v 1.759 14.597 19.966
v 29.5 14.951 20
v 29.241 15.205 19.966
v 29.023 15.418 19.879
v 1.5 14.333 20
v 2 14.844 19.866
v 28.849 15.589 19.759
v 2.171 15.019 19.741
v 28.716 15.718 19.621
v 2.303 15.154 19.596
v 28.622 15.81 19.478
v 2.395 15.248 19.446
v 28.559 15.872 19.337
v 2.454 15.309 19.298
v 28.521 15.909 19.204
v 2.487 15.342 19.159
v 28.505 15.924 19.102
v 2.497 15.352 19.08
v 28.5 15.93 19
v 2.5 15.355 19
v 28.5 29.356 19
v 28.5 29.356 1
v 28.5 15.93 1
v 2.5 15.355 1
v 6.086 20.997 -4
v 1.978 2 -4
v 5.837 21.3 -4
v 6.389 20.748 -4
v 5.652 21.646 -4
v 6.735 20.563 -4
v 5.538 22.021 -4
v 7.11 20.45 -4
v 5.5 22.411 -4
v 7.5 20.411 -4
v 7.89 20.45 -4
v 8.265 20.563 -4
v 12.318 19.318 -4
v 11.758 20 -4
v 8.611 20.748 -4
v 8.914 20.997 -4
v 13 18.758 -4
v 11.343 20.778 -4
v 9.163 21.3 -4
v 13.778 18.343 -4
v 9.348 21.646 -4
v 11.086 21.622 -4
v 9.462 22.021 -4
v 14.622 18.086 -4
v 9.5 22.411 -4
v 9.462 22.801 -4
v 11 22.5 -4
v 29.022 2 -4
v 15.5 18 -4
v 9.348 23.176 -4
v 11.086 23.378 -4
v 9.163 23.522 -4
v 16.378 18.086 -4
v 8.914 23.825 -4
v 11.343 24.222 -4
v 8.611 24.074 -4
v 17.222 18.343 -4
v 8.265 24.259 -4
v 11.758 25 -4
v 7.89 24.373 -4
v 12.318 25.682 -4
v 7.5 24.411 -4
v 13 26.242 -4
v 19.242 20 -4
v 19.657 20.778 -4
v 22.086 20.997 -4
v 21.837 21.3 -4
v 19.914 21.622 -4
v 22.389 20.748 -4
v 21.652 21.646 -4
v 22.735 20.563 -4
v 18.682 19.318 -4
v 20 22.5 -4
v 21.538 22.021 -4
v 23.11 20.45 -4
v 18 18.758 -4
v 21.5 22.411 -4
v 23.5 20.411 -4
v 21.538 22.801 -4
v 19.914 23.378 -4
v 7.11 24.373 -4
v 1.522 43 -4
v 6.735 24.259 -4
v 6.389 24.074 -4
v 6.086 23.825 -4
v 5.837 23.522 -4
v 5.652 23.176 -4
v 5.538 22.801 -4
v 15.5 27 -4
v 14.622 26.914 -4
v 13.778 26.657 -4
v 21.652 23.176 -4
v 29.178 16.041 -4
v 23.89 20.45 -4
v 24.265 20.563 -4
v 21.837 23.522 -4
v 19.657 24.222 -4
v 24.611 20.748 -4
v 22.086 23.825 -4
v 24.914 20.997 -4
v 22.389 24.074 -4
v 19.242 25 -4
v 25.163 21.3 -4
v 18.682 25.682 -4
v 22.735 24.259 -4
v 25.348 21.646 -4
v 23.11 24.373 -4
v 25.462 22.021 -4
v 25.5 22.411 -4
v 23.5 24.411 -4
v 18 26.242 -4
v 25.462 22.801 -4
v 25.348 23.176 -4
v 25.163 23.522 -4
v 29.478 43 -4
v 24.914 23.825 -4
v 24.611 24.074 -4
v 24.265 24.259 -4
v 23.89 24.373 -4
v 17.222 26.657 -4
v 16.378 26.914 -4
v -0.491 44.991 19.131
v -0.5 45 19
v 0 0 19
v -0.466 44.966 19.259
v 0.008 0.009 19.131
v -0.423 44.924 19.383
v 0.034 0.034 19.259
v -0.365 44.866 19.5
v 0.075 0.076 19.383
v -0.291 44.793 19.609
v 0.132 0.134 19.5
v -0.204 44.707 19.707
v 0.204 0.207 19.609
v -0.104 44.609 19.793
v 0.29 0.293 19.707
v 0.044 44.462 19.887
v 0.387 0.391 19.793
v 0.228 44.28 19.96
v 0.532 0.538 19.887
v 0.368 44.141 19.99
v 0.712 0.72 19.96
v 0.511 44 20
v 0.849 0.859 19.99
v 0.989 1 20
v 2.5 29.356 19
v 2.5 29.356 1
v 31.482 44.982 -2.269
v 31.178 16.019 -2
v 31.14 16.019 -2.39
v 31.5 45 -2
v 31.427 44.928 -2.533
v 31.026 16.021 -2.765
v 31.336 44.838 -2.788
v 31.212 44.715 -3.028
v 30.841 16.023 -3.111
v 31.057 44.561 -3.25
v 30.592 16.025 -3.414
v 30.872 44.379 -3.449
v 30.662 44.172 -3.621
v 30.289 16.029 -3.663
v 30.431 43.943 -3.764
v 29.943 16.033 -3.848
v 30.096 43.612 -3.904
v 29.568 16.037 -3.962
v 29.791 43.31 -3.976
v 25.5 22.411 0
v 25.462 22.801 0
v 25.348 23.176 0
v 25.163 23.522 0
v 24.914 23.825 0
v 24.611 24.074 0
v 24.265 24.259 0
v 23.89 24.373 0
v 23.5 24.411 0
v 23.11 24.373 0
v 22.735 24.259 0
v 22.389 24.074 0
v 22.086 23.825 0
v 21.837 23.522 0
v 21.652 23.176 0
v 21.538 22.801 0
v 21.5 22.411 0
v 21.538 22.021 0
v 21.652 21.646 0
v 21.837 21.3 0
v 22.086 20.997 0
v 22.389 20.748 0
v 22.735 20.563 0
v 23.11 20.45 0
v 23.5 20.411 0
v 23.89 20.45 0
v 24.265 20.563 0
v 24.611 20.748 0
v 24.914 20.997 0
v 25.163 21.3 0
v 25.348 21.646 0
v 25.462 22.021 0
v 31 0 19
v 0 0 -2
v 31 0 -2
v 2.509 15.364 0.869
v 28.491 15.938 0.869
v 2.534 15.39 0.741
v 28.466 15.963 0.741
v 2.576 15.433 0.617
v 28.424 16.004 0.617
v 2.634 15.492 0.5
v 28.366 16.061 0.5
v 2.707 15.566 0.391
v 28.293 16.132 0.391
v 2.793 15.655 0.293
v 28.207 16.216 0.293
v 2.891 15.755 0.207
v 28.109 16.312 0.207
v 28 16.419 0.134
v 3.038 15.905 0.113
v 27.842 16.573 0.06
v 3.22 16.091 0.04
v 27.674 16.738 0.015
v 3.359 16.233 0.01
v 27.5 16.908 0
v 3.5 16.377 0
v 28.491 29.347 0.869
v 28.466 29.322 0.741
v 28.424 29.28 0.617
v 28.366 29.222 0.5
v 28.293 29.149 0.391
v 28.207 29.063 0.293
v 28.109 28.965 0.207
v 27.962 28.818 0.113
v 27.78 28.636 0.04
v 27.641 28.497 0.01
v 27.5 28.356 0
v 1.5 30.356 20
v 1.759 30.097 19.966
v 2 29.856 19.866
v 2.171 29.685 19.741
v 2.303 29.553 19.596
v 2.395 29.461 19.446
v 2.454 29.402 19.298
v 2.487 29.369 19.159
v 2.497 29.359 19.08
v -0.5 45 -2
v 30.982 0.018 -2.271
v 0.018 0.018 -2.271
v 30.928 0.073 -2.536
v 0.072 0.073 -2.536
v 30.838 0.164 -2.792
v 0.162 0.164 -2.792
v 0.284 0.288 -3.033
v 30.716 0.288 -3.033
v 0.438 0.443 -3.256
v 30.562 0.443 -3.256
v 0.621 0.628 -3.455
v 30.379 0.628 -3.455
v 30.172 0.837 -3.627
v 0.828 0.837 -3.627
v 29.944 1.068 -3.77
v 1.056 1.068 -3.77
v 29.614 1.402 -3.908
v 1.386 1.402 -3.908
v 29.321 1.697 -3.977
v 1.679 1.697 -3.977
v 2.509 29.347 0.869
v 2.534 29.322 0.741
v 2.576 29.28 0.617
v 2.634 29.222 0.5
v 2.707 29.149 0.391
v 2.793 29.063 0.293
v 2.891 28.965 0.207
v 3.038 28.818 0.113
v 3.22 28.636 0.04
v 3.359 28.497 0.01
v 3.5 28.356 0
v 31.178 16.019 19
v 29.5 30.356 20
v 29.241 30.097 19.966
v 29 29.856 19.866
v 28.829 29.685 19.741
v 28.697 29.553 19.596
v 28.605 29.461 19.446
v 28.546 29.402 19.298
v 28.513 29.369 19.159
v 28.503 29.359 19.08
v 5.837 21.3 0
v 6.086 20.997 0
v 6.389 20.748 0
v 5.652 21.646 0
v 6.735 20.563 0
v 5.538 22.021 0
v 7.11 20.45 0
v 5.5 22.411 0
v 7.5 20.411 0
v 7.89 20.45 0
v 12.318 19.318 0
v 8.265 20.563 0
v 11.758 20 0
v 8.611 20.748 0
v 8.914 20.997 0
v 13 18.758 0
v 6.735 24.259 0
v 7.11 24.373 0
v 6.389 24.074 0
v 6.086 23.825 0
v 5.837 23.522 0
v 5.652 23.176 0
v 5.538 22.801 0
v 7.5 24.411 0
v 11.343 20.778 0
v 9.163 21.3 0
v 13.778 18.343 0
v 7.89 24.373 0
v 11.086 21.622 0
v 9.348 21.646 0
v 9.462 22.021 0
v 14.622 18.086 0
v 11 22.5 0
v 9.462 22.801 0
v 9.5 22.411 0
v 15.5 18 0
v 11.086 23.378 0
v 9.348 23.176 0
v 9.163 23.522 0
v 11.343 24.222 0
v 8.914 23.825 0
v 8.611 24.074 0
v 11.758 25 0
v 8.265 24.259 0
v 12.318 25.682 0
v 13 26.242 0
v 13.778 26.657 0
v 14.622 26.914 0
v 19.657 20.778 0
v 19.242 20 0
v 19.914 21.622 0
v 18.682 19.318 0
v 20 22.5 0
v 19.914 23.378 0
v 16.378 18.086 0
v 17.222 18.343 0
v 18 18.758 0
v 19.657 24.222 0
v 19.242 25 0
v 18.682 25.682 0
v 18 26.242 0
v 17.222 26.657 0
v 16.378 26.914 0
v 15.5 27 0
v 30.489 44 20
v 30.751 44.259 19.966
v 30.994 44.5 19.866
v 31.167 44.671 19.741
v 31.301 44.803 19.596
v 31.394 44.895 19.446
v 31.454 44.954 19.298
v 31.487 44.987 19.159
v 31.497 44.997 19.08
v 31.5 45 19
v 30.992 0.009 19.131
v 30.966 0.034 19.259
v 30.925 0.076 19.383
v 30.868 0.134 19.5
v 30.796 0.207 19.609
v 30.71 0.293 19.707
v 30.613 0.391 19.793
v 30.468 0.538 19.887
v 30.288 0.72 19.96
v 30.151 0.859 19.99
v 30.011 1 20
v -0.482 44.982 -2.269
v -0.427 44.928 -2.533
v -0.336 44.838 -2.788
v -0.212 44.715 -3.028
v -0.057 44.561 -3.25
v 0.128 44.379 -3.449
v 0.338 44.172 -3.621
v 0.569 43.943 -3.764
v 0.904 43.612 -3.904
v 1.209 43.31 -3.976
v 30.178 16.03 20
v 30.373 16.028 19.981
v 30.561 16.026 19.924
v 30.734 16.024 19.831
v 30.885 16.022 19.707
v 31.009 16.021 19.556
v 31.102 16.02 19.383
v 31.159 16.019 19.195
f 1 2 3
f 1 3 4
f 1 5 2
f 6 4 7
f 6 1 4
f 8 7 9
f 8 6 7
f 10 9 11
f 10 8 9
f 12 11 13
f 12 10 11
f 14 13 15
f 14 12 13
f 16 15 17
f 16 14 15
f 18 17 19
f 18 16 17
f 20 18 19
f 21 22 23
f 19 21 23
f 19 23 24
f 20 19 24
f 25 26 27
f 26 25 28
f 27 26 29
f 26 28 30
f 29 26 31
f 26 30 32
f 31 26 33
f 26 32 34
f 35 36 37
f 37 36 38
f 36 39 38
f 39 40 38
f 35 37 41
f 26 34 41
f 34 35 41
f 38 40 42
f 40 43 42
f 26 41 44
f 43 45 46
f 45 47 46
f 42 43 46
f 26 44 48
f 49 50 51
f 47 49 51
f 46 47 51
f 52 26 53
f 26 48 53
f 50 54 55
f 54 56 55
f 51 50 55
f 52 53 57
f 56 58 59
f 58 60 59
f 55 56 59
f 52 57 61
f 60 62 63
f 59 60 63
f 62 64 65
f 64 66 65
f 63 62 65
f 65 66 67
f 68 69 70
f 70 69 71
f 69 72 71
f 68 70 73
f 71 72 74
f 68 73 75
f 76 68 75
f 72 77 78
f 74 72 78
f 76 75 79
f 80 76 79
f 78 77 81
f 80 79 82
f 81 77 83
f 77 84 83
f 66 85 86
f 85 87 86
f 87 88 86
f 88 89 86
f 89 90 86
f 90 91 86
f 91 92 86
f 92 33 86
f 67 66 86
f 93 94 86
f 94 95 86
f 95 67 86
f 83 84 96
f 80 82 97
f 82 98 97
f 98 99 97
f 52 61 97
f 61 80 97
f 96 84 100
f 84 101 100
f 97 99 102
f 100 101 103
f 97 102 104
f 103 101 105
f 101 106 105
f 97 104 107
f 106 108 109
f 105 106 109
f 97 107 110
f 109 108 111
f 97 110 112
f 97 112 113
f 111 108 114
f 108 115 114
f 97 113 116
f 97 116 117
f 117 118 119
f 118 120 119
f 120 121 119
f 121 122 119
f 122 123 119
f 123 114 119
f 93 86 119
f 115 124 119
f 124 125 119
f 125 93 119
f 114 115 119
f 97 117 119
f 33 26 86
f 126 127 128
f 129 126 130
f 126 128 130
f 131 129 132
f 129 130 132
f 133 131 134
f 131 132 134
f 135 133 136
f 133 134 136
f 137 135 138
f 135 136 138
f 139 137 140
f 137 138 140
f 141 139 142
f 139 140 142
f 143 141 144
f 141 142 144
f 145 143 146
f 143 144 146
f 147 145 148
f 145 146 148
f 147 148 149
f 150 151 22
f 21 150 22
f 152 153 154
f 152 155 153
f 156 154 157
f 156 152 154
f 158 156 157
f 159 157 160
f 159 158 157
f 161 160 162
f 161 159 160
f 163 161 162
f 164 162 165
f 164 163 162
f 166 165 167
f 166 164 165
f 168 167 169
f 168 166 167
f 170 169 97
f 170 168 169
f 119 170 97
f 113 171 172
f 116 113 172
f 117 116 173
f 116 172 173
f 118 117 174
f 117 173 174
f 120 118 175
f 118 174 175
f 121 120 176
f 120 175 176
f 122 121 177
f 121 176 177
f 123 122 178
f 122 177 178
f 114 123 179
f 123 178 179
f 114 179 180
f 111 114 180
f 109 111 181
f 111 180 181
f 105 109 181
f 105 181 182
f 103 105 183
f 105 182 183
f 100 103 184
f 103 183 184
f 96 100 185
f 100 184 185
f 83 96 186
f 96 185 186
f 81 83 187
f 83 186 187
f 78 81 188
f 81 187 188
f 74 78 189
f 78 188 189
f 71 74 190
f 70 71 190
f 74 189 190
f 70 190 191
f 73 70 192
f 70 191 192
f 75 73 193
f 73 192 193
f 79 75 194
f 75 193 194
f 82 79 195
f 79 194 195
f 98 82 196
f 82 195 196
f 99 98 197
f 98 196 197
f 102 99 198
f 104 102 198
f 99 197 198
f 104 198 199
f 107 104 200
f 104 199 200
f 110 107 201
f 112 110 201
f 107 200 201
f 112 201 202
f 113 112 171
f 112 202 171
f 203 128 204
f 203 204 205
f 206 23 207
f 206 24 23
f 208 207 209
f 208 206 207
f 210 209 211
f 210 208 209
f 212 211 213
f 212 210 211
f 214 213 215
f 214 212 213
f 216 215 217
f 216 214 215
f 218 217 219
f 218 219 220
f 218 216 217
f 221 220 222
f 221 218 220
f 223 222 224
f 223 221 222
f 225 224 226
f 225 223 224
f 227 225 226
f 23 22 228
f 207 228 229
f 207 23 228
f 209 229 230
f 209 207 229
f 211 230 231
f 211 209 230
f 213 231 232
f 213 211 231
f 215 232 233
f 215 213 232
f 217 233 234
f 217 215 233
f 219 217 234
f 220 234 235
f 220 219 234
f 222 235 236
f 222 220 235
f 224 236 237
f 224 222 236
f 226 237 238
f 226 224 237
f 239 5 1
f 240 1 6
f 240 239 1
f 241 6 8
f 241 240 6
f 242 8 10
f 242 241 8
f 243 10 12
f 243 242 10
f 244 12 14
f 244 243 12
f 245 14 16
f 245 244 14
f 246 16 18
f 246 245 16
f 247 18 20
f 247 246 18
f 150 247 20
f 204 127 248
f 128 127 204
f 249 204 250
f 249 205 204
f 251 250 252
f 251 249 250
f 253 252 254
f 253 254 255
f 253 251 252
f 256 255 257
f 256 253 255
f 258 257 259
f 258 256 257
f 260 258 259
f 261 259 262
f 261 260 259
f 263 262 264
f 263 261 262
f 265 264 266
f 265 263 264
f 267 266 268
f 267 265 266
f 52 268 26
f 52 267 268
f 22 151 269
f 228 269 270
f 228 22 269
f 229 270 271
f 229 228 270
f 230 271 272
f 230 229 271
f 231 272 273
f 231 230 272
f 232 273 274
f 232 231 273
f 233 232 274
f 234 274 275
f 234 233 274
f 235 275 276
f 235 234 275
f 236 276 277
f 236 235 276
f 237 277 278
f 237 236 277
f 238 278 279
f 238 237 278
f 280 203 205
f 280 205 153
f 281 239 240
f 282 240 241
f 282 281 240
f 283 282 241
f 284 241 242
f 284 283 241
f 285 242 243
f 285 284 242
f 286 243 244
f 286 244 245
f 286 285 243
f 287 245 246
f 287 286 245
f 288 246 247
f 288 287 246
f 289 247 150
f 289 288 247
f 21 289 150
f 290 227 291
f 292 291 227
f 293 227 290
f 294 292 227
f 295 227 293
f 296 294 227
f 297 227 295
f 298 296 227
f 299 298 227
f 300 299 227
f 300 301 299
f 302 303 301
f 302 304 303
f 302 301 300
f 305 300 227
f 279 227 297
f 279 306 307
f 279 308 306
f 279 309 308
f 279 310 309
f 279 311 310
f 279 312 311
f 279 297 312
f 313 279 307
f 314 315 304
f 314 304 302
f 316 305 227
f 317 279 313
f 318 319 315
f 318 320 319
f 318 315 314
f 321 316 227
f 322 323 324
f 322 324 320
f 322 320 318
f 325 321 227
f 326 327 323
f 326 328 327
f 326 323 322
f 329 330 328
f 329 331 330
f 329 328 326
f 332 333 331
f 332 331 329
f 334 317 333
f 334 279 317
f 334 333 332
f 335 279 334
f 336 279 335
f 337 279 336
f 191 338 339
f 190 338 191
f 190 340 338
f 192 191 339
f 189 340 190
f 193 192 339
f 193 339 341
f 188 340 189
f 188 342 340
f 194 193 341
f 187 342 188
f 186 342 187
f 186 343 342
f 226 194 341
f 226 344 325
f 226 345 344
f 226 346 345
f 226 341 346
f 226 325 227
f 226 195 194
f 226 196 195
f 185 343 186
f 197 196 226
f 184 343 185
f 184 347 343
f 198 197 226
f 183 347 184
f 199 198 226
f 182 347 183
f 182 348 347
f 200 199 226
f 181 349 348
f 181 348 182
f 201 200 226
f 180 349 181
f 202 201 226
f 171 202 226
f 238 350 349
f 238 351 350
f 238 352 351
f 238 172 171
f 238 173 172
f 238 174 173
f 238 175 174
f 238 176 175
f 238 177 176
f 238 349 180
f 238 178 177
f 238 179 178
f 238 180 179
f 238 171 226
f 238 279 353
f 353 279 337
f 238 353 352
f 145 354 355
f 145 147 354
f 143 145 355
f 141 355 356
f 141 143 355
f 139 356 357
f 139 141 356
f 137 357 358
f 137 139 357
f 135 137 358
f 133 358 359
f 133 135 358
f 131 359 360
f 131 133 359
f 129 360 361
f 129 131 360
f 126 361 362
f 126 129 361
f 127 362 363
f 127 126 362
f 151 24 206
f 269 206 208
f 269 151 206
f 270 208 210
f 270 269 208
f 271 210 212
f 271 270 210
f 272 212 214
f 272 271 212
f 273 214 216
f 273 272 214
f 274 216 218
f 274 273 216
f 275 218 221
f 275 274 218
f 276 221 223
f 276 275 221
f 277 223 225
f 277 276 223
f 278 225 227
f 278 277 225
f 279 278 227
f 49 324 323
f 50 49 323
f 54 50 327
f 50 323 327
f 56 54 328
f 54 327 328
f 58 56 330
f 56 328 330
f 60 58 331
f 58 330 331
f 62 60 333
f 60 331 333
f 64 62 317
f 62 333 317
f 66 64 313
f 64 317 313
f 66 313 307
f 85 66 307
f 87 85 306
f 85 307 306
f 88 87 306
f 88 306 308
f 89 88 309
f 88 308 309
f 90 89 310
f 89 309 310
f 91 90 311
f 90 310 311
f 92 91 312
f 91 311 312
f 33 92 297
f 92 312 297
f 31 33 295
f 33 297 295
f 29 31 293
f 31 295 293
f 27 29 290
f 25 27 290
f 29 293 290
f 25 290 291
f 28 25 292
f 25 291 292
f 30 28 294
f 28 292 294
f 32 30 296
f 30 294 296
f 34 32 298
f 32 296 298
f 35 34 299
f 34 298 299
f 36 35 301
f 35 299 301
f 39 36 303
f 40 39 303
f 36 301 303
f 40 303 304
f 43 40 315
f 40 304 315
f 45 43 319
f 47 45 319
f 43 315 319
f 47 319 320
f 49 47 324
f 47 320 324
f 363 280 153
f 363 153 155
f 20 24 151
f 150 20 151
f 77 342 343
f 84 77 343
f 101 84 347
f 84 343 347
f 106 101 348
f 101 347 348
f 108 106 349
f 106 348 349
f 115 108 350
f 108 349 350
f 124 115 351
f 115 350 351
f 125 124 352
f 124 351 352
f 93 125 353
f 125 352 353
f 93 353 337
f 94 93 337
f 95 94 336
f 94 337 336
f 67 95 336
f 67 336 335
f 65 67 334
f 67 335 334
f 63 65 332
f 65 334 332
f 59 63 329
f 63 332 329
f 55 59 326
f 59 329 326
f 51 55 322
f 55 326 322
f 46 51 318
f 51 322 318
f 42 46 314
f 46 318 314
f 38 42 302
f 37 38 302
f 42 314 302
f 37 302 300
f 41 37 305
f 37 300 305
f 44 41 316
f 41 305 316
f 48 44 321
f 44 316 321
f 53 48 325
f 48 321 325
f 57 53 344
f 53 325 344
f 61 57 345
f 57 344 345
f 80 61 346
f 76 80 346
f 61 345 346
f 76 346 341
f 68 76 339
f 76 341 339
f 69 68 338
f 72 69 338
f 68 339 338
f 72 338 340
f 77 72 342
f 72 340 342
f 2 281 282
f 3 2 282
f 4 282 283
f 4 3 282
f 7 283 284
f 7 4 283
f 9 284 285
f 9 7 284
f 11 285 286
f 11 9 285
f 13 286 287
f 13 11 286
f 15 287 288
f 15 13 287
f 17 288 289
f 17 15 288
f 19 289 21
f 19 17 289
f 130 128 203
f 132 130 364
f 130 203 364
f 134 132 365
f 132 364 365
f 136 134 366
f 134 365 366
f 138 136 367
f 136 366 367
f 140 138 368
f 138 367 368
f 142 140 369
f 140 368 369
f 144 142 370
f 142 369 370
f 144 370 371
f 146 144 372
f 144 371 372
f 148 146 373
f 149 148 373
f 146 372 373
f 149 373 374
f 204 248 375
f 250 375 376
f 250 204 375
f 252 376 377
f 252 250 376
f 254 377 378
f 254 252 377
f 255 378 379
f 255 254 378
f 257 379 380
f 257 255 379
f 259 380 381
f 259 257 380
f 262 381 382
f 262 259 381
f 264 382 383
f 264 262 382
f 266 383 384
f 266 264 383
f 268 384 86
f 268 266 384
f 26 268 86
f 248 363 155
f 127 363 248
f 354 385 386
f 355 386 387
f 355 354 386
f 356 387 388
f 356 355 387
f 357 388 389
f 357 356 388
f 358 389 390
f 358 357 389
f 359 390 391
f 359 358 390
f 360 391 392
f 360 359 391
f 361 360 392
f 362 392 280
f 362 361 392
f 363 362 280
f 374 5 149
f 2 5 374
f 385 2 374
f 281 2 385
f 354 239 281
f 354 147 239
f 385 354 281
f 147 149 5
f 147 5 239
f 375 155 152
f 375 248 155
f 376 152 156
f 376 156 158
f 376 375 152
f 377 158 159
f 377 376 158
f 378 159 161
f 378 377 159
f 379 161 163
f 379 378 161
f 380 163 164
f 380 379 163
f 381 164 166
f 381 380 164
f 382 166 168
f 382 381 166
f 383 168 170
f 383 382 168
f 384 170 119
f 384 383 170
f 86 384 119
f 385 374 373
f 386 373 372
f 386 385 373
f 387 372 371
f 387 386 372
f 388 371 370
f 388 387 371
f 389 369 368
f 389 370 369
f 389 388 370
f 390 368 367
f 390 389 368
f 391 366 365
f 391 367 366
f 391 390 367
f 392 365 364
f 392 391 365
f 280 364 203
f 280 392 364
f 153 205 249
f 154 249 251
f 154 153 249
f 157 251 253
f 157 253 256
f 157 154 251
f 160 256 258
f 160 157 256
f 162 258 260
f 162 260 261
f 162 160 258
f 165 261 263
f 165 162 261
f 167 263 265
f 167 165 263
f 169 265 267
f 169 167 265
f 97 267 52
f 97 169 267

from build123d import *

# Parameters (mm, degrees)
F1_DEPTH = 20
F0_R     = 2
F0_R_2   = 4.5
F2_DEPTH = 4
F3_R     = 2
F4_R     = 1


with BuildPart() as f1:
    # F0 (on Top) → F1 (new body)
    with BuildSketch(Plane.XY):
        Polygon((-0.5, 45), (0, 0), (31, 0), (31.1779875703, 16.0188813289), (31.5, 45), (15.5, 45), align=None)
        Polygon((28.5000000559, 15.9295856795), (2.4999999441, 15.3551234695), (2.4999999441, 29.3559876404), (28.5000000559, 29.3559876404), align=None, mode=Mode.SUBTRACT)
    extrude(amount=F1_DEPTH)

    # F0 (on Top) → F2 (join)
    with BuildSketch(Plane.XY):
        Polygon((-0.5, 45), (0, 0), (31, 0), (31.1779875703, 16.0188813289), (31.5, 45), (15.5, 45), align=None)
        Polygon((28.5000000559, 15.9295856795), (2.4999999441, 15.3551234695), (2.4999999441, 29.3559876404), (28.5000000559, 29.3559876404), align=None, mode=Mode.SUBTRACT)
        Polygon((2.4999999441, 29.3559876404), (2.4999999441, 15.3551234695), (28.5000000559, 15.9295856795), (28.5000000559, 29.3559876404), align=None)
        with Locations((7.5, 22.4111111111)):
            Circle(F0_R, mode=Mode.SUBTRACT)
        with Locations((23.5, 22.4111111111)):
            Circle(F0_R, mode=Mode.SUBTRACT)
        with Locations((15.5, 22.5)):
            Circle(F0_R_2, mode=Mode.SUBTRACT)
    extrude(amount=-F2_DEPTH)

    # F3
    f3_edges = [f1.edges().sort_by_distance(p)[0] for p in [
        (31.25, 22.5, -4),
        (15.5, 0, -4),
        (-0.25, 22.5, -4),
        (15.5, 45, -4),
    ]]
    fillet(f3_edges, radius=F3_R)

    # F4
    f4_edges = [f1.edges().sort_by_distance(p)[0] for p in [
        (15.5, 0, 20),
        (31.25, 22.5, 20),
        (-0.25, 22.5, 20),
        (15.5, 45, 20),
        (15.5, 29.355988, 20),
        (28.5, 22.642787, 20),
        (15.5, 15.642355, 20),
        (2.5, 22.355556, 20),
        (28.5, 22.642787, 0),
        (15.5, 15.642355, 0),
        (15.5, 29.355988, 0),
        (2.5, 22.355556, 0),
    ]]
    fillet(f4_edges, radius=F4_R)


solid = f1.part
